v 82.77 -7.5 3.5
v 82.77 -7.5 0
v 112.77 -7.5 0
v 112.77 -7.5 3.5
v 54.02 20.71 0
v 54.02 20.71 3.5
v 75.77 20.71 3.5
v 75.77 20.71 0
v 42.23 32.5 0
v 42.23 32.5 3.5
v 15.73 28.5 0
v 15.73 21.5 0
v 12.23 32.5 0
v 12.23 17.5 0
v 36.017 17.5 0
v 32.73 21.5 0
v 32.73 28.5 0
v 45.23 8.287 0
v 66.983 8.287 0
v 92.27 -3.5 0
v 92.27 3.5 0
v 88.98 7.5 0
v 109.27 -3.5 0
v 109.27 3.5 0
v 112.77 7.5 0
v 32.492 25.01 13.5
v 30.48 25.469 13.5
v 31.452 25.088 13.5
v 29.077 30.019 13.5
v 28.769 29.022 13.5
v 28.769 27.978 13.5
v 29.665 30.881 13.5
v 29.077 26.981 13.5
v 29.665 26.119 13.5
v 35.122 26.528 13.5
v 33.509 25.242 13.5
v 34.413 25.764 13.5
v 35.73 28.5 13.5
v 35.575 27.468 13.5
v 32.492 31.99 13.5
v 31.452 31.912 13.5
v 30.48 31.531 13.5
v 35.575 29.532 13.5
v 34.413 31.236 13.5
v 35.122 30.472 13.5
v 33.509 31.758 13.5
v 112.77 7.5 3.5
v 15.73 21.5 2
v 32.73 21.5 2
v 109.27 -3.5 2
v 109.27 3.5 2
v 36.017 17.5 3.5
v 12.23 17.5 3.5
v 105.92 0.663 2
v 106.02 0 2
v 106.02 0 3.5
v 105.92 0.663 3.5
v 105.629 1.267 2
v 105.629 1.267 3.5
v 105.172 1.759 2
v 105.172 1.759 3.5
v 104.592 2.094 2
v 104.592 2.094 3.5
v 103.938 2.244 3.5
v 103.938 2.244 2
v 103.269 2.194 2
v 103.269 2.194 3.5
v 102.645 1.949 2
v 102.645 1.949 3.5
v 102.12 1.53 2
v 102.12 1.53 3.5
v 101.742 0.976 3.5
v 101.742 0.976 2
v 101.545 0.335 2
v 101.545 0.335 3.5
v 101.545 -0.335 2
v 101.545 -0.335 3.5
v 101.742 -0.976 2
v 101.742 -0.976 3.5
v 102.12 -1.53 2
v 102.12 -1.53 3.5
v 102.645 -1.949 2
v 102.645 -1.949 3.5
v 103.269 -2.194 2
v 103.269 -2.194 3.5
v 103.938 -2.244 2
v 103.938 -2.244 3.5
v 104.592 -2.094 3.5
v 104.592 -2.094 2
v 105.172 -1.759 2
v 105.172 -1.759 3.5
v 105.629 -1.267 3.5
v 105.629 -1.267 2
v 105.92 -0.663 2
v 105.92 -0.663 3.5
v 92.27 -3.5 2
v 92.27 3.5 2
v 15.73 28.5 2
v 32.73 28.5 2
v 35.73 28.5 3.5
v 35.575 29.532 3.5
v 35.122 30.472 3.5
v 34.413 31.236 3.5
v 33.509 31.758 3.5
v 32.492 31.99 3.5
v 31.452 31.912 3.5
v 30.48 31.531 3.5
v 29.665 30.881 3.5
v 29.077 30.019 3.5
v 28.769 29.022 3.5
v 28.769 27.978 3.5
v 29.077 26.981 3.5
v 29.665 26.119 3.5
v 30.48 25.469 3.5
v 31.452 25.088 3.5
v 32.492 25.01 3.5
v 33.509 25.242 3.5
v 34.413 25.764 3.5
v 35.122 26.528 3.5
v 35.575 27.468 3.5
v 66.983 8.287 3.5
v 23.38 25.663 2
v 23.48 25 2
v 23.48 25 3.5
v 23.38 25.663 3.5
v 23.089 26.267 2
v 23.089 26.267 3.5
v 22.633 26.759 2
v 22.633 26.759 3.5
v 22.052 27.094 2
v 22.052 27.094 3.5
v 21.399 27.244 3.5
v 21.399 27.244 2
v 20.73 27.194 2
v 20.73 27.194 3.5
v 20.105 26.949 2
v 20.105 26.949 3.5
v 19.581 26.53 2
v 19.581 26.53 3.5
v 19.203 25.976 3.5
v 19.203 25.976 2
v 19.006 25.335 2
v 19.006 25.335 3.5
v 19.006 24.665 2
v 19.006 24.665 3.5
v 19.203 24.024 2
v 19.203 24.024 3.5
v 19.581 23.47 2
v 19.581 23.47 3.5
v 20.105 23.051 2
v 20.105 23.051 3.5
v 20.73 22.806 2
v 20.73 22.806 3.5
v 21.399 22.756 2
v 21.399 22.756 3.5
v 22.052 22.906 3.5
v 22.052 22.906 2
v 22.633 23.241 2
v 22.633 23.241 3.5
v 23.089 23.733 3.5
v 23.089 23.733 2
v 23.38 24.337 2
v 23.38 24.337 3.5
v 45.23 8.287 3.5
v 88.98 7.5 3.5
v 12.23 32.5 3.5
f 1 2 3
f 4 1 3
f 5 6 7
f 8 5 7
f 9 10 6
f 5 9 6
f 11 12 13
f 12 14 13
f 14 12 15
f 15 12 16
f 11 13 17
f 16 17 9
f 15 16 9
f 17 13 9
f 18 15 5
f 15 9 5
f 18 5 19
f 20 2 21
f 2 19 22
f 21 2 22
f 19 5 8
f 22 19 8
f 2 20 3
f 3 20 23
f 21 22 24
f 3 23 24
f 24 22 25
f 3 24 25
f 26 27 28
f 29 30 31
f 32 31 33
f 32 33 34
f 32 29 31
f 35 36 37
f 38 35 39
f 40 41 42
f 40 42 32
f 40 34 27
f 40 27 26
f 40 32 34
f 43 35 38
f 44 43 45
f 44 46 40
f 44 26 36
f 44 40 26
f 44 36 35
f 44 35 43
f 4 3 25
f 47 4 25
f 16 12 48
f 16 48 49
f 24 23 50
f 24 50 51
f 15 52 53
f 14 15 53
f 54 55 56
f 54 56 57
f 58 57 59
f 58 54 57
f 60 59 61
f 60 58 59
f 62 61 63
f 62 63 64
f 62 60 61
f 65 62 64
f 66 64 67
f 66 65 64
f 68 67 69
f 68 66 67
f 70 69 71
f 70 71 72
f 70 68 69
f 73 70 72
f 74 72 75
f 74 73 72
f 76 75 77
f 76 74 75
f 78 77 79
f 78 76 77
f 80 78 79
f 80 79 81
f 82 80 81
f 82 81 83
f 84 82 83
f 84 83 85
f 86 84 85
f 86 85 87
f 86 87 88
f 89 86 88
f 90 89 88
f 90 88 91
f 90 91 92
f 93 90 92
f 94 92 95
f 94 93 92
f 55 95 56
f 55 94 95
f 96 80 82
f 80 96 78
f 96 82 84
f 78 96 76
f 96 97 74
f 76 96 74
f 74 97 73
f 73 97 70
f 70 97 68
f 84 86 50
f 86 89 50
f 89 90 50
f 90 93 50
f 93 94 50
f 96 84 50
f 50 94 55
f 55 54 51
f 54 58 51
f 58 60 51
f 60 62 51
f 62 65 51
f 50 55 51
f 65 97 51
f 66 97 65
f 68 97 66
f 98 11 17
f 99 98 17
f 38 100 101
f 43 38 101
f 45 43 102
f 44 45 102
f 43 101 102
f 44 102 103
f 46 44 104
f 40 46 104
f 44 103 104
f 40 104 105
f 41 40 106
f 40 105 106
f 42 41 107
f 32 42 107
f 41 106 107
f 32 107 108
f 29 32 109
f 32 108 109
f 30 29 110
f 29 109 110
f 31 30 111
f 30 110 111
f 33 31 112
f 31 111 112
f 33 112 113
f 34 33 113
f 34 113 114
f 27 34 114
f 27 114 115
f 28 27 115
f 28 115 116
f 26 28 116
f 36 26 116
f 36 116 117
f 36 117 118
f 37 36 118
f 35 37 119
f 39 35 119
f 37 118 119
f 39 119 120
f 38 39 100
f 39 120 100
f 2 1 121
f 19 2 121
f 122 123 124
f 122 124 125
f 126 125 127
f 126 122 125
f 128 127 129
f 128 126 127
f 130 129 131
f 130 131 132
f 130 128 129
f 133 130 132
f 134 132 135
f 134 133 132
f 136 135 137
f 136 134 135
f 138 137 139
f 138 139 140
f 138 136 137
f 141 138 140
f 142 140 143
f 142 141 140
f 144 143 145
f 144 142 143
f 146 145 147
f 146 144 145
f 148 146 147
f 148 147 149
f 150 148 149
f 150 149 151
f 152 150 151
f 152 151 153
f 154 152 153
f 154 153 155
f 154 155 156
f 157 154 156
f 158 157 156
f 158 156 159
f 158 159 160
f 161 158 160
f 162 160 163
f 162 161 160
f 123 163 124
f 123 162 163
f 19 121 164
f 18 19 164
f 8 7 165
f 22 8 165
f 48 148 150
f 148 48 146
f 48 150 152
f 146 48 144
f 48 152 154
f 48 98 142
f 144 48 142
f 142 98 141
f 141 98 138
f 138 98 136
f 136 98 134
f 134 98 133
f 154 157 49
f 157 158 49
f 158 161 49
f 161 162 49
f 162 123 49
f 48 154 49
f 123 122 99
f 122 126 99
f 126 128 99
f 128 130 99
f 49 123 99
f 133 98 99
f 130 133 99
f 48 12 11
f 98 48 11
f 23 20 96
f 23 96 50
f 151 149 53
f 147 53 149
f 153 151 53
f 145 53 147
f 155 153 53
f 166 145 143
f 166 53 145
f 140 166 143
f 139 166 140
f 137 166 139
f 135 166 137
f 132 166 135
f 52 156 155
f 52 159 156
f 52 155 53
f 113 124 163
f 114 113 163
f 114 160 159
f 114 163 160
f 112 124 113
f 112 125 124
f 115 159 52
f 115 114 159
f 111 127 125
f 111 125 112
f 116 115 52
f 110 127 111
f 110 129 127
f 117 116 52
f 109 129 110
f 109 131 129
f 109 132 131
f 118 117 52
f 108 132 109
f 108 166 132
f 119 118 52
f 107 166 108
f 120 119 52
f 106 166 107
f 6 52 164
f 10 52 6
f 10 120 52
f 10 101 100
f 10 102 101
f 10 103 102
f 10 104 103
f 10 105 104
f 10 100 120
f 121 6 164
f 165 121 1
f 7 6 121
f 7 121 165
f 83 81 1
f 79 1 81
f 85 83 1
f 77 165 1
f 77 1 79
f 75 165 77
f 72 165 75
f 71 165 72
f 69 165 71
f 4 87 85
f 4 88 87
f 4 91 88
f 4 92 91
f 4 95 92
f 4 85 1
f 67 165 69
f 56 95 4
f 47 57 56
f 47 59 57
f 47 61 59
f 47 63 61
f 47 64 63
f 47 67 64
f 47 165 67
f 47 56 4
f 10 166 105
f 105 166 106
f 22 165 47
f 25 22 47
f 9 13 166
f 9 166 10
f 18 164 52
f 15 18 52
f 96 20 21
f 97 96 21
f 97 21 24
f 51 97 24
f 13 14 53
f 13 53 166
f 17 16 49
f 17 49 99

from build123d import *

# Parameters (mm, degrees)
SKETCH_1_W          = 100.539230484
SKETCH_1_H          = 40
SKETCH_1_W_2        = 17
SKETCH_1_H_2        = 7
EXTRUDE_1_DEPTH     = 2
SKETCH_2_W          = 100.539230484
SKETCH_2_H          = 40
SKETCH_2_R          = 2.25
EXTRUDE_2_DEPTH     = 1.5
SKETCH_3_W          = 184.808915215
SKETCH_3_H          = 94.825170589
CUT_EXTRUDE_1_DEPTH = 31.5
SKETCH_4_R          = 3.5
EXTRUDE_3_DEPTH     = 10


with BuildPart() as part:
    # Эскиз1 → Бобышка-Вытянуть1 (new body)
    with BuildSketch(Plane.XY):
        with Locations((62.5, 12.5)):
            Rectangle(SKETCH_1_W, SKETCH_1_H)
        with Locations((24.230384758, 25)):
            Rectangle(SKETCH_1_W_2, SKETCH_1_H_2, mode=Mode.SUBTRACT)
        with Locations((100.769615242, 0)):
            Rectangle(SKETCH_1_W_2, SKETCH_1_H_2, mode=Mode.SUBTRACT)
    extrude(amount=EXTRUDE_1_DEPTH)

    # Эскиз2 → Бобышка-Вытянуть2 (add)
    with BuildSketch(Plane.XY.offset(2)):
        with Locations((62.5, 12.5)):
            Rectangle(SKETCH_2_W, SKETCH_2_H)
        with Locations((21.230384758, 25)):
            Circle(SKETCH_2_R, mode=Mode.SUBTRACT)
        with Locations((103.769615242, 0)):
            Circle(SKETCH_2_R, mode=Mode.SUBTRACT)
    extrude(amount=EXTRUDE_2_DEPTH)

    # Эскиз3 → Вырез-Вытянуть1 (cut)
    with BuildSketch(Plane.XY.offset(3.5)):
        with Locations((81.231416835, 7.831688581)):
            Rectangle(SKETCH_3_W, SKETCH_3_H)
        Polygon((12.230384758, 32.5), (42.230384758, 32.5), (54.020384758, 20.71), (75.769615242, 20.71), (88.979615242, 7.5), (112.769615242, 7.5), (112.769615242, -7.5), (82.769615242, -7.5), (66.982818678, 8.286796564), (45.230384758, 8.286796564), (36.017181322, 17.5), (12.230384758, 17.5), align=None, mode=Mode.SUBTRACT)
    extrude(amount=-CUT_EXTRUDE_1_DEPTH, mode=Mode.SUBTRACT)

    # Эскиз4 → Бобышка-Вытянуть3 (add)
    with BuildSketch(Plane.XY.offset(3.5)):
        with Locations((32.230384758, 28.5)):
            Circle(SKETCH_4_R)
    extrude(amount=EXTRUDE_3_DEPTH)


solid = part.part
